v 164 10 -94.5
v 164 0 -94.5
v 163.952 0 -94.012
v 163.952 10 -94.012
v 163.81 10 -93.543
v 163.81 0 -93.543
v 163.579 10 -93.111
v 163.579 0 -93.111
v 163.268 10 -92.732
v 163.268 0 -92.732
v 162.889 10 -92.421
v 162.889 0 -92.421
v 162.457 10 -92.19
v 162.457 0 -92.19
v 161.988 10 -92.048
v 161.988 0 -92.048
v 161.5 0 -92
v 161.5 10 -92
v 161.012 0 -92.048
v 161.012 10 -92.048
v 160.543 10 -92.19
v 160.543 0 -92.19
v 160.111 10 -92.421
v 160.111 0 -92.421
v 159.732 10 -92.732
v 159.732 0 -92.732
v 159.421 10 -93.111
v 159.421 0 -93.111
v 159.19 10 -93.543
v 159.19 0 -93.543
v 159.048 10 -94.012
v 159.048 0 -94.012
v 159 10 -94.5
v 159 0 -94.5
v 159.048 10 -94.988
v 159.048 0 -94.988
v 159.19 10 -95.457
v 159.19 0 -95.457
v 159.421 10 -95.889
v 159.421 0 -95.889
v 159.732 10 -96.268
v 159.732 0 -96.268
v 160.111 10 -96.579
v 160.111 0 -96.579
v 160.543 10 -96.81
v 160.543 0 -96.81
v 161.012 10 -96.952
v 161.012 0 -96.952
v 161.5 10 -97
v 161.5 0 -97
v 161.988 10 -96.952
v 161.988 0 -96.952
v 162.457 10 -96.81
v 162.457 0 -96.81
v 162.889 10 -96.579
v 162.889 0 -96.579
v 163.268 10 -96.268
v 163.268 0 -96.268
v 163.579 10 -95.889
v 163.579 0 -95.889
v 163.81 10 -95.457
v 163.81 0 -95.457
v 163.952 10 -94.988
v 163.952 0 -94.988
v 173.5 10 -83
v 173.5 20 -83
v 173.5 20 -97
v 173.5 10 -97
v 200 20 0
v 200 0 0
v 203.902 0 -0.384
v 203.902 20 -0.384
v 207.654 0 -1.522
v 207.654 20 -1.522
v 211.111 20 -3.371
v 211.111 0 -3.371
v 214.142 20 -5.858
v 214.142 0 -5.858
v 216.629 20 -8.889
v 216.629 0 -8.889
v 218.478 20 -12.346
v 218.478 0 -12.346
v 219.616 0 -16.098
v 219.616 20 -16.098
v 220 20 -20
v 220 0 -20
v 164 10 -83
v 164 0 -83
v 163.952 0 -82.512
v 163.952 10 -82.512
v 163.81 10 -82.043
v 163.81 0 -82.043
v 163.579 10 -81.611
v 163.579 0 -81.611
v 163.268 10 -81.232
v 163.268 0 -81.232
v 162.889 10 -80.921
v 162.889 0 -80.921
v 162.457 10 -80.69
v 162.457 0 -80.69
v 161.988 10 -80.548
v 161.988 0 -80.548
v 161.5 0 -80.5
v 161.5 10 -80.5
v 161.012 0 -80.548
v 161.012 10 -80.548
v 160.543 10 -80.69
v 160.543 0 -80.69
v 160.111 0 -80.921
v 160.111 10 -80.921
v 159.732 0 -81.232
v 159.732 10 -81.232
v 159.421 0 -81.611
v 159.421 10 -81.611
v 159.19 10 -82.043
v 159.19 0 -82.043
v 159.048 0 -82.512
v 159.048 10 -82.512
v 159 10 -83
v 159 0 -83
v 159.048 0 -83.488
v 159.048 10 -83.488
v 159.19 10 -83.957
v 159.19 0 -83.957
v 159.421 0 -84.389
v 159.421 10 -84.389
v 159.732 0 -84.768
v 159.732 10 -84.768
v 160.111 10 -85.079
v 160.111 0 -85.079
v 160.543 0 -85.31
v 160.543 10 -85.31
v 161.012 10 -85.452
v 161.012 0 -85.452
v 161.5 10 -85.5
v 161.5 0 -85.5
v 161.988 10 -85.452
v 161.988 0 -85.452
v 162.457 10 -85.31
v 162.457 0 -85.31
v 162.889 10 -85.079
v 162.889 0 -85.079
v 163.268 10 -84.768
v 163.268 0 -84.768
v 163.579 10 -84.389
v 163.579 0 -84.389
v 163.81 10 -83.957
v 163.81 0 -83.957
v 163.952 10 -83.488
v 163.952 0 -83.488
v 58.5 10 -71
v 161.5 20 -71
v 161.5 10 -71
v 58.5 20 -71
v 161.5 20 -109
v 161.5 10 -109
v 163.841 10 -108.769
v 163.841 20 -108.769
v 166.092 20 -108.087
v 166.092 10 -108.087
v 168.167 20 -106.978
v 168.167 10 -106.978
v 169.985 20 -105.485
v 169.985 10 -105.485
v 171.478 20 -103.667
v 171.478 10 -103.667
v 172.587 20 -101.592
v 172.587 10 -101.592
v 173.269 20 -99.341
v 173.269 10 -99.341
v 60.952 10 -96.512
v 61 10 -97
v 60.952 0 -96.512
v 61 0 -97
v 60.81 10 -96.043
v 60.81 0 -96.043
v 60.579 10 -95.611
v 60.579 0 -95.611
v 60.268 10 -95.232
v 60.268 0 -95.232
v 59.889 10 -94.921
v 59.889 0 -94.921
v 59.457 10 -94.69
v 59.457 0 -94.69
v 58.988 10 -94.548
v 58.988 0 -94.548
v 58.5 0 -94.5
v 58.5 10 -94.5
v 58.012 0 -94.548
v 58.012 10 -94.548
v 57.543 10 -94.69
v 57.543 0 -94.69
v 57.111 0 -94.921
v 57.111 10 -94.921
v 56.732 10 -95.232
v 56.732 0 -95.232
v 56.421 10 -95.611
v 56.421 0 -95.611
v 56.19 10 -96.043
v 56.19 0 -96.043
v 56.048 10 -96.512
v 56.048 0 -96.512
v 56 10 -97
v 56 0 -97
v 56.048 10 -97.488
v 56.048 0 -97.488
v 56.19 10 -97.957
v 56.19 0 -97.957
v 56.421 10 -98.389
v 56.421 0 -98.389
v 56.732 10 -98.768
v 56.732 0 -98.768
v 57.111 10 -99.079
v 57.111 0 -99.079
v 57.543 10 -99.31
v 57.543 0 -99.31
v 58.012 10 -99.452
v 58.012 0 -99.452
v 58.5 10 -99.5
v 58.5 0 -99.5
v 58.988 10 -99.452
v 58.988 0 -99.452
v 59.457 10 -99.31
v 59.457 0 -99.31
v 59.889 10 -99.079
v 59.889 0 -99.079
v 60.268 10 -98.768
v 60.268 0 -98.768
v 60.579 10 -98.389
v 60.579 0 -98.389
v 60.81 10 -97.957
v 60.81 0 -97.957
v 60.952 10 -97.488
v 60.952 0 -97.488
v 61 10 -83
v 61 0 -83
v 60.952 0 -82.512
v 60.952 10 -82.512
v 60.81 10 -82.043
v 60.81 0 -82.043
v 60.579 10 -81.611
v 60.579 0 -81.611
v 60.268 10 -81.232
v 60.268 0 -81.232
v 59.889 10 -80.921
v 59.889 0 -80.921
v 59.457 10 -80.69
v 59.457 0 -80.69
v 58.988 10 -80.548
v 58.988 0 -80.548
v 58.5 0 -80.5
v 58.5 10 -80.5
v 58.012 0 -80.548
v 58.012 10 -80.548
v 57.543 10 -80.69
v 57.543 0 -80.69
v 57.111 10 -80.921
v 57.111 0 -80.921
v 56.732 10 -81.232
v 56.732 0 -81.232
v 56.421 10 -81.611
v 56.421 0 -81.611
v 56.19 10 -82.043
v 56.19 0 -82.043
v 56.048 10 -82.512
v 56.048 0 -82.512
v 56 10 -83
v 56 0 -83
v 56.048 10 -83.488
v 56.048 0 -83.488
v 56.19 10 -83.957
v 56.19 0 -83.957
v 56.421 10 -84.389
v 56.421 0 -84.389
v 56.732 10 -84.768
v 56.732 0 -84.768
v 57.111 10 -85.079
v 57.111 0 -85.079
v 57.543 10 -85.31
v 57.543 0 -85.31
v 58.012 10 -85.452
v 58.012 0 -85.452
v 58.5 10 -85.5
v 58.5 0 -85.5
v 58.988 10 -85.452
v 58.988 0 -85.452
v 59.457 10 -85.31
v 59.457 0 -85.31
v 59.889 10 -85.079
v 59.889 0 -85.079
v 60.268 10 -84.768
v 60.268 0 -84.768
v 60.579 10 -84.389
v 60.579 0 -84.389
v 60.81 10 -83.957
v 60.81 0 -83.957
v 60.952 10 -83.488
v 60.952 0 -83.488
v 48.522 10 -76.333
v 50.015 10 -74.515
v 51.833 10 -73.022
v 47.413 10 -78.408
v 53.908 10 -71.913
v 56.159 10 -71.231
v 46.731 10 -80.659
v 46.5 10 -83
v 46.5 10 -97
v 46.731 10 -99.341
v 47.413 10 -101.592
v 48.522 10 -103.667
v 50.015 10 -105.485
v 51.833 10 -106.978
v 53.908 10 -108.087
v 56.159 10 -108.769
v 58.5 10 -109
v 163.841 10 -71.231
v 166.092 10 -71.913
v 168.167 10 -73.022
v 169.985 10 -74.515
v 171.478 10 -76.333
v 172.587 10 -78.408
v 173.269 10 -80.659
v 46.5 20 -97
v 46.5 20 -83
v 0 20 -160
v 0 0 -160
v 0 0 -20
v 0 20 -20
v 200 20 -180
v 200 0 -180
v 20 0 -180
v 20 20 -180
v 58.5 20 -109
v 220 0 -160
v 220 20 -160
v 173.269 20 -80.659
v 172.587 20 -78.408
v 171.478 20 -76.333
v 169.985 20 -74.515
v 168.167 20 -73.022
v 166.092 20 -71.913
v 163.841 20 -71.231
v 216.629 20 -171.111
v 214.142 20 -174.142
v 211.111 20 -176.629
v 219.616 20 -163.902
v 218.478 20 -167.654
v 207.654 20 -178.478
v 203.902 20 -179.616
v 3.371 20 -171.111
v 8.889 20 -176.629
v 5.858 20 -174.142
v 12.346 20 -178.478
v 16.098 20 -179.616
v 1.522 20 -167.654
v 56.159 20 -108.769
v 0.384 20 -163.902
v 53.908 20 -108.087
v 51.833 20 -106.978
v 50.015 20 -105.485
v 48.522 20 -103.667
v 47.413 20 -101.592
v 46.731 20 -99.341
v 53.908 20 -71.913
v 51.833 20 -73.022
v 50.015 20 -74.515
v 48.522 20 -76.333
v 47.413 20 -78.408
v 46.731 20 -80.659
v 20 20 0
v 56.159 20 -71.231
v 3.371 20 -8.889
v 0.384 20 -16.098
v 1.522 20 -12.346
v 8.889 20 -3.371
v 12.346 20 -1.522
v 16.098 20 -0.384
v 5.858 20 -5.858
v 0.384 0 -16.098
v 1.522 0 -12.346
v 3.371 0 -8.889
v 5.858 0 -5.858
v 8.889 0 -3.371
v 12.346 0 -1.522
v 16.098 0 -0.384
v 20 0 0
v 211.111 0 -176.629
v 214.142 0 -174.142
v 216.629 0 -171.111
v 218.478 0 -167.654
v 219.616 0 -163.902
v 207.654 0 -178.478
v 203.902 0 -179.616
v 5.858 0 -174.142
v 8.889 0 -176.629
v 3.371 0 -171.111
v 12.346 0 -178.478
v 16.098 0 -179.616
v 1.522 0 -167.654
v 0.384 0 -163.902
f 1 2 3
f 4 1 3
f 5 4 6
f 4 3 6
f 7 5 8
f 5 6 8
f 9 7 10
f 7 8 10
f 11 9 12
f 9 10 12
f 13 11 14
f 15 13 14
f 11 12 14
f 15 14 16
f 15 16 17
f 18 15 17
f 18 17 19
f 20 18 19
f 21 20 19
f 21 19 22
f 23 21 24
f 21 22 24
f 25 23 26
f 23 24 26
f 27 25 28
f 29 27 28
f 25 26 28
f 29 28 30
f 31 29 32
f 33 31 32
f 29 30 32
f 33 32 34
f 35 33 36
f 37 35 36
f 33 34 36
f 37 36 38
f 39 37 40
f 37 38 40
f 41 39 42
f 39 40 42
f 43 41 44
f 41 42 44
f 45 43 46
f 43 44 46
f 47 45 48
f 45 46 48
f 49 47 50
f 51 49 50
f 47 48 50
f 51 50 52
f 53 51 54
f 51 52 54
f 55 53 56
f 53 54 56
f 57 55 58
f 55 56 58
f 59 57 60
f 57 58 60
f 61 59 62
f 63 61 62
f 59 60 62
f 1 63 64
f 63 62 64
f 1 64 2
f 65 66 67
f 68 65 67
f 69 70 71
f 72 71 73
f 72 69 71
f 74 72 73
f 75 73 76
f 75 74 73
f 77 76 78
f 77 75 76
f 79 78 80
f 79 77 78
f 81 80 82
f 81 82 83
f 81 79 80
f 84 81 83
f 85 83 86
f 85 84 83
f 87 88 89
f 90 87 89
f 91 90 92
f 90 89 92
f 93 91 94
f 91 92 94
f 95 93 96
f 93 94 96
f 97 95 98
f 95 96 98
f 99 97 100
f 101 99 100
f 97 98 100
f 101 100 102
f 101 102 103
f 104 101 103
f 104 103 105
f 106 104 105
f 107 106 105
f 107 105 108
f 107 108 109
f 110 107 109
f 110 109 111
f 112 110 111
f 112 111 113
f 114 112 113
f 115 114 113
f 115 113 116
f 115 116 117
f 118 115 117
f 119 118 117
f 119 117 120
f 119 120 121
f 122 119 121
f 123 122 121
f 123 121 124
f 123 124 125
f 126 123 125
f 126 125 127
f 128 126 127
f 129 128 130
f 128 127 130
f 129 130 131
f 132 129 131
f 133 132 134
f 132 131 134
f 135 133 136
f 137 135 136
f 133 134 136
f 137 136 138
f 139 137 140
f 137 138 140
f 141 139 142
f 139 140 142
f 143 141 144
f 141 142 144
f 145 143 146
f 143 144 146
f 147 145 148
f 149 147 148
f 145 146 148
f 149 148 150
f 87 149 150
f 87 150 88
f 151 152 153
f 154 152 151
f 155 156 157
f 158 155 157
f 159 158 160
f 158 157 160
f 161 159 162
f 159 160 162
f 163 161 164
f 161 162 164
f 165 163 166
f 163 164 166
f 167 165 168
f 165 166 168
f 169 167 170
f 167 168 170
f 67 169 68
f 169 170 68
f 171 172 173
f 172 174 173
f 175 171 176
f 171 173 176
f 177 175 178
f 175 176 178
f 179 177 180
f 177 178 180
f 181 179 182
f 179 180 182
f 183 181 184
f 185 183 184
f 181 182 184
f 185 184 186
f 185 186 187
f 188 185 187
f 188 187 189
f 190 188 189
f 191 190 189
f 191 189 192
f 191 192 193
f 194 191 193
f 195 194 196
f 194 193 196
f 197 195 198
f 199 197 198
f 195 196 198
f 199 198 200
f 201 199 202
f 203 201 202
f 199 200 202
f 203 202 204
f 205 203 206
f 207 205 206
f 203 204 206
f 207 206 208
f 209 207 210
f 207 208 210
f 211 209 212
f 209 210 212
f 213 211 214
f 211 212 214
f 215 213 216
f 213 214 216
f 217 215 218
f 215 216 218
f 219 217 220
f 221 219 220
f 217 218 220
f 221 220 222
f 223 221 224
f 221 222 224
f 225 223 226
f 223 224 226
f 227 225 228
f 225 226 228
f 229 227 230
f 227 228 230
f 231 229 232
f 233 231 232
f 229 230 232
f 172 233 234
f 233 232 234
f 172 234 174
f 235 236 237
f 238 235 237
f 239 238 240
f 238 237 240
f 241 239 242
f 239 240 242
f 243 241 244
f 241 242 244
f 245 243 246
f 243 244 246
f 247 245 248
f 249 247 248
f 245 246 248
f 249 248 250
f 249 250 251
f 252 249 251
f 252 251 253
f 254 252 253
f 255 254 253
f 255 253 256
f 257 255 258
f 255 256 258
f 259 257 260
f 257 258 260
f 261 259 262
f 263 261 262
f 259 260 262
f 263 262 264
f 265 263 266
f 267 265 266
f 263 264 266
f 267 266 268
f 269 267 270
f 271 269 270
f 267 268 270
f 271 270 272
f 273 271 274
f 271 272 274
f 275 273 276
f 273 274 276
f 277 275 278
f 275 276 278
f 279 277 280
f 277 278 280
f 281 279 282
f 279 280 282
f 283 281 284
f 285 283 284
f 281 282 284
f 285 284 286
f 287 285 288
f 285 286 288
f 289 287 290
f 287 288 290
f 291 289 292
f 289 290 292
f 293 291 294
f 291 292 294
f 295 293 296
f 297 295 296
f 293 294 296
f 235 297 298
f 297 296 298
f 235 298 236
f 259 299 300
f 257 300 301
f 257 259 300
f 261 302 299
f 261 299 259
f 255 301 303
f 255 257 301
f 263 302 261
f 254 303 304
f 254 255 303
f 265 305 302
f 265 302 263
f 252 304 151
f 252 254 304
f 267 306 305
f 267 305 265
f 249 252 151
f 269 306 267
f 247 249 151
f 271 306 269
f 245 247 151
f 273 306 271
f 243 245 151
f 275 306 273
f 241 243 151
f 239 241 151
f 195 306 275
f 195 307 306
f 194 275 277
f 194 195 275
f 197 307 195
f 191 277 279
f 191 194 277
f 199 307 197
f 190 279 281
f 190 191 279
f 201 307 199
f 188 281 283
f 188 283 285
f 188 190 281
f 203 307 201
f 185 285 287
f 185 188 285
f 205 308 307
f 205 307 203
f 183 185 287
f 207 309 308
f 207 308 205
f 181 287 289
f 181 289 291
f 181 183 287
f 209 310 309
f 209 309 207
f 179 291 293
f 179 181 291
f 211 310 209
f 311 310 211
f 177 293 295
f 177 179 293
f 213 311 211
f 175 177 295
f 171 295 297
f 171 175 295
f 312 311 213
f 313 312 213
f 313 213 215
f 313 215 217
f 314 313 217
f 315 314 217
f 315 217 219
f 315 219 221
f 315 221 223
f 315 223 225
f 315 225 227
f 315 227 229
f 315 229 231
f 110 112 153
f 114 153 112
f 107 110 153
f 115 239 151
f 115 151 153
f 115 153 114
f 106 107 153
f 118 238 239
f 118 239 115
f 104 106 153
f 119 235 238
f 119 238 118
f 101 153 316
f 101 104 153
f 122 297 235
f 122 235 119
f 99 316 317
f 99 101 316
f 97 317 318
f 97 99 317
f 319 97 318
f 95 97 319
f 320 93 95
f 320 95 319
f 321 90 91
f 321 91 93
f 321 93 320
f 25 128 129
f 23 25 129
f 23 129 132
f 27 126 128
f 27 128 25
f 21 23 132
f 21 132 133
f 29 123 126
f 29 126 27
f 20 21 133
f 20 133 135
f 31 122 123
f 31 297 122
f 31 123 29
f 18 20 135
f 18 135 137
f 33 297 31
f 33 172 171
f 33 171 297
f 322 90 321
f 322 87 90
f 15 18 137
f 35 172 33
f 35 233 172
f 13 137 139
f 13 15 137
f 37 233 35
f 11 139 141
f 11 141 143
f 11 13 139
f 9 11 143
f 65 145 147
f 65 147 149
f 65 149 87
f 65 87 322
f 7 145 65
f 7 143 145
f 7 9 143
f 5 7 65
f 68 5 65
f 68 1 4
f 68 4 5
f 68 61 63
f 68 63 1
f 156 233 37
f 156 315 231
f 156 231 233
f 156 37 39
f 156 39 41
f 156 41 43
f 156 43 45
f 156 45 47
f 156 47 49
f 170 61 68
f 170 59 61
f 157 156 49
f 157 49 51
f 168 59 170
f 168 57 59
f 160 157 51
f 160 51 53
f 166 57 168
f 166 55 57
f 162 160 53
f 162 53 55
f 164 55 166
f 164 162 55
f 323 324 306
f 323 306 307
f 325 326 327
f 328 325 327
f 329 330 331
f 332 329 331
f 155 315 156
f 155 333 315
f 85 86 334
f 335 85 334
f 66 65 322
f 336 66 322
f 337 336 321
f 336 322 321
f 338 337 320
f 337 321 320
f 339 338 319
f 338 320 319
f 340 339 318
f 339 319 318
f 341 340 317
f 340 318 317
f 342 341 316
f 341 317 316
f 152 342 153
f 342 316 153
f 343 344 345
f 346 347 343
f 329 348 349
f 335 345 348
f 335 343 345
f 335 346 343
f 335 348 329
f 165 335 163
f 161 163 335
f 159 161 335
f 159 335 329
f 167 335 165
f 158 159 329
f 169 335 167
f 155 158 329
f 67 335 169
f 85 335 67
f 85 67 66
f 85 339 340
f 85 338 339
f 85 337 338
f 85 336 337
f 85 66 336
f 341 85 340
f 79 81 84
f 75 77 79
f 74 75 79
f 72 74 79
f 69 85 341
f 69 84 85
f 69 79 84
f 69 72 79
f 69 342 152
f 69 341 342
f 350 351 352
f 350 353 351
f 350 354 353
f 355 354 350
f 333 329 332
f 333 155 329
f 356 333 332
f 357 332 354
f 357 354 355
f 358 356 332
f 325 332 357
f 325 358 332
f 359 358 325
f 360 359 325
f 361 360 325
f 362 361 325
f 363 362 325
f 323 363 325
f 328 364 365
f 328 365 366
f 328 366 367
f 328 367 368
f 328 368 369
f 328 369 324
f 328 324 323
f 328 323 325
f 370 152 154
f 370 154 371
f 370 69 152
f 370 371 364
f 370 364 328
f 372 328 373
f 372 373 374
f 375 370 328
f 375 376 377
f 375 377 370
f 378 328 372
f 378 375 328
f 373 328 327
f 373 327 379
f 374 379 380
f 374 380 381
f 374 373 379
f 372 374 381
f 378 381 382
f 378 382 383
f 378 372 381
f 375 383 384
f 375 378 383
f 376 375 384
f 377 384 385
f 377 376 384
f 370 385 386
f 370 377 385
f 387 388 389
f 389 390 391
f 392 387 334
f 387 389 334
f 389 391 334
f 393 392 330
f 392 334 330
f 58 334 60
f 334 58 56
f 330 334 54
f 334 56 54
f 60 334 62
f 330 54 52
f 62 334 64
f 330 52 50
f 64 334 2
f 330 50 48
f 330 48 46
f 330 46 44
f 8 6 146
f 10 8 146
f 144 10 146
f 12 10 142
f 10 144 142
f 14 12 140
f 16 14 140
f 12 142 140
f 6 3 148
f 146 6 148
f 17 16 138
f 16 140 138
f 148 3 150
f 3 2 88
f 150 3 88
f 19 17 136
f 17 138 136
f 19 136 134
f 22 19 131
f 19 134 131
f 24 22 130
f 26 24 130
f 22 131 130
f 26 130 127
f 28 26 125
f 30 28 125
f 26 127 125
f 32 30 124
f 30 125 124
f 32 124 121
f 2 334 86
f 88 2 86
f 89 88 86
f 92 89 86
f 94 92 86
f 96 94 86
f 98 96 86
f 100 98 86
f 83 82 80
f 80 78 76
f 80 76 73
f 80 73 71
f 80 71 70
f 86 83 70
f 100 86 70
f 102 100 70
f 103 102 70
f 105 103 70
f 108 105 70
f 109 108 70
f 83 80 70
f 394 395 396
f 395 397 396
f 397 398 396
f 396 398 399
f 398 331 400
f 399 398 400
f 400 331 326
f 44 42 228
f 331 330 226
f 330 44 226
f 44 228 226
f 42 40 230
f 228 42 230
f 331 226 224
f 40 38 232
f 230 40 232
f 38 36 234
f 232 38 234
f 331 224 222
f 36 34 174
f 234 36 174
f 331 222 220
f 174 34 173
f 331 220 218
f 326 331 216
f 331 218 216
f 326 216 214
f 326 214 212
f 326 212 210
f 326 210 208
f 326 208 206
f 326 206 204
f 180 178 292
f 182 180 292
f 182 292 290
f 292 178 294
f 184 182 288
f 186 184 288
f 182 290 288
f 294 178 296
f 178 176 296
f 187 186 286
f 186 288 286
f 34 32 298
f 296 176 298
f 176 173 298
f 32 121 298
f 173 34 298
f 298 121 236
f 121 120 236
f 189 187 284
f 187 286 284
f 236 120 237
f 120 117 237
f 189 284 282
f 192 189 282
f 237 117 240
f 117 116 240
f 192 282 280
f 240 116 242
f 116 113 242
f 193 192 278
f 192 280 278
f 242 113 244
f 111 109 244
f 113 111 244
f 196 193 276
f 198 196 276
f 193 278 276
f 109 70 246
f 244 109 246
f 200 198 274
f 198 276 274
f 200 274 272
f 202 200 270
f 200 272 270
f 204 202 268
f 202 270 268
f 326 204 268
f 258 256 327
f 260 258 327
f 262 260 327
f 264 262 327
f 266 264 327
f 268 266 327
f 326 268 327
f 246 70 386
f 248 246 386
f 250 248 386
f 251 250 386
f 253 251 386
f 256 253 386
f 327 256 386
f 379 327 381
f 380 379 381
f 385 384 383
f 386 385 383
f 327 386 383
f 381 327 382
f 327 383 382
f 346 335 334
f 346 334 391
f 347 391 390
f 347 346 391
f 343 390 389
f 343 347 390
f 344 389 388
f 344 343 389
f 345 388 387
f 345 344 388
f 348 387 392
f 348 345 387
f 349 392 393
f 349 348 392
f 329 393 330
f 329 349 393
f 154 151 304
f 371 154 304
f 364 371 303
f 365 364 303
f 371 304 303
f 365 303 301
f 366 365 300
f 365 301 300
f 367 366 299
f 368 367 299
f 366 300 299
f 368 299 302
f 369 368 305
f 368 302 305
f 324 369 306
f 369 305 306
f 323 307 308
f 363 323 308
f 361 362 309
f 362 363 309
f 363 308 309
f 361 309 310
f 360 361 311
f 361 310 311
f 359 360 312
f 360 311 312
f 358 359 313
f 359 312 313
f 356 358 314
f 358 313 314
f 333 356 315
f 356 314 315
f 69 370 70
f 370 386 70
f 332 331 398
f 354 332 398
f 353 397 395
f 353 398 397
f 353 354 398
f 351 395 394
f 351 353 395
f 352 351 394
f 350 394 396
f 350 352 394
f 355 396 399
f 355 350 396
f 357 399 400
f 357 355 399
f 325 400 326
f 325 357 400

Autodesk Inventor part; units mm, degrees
ref_plane "YZ Plane" through (0, 0, 0) normal (1, 0, 0) x (0, 1, 0)
ref_plane "XZ Plane" through (0, 0, 0) normal (0, 1, 0) x (-1, 0, 0)
ref_plane "XY Plane" through (0, 0, 0) normal (0, 0, 1) x (1, 0, 0)
sketch "Sketch2" plane through (0, 0, 0) normal (0, 1, 0) x (-1, 0, 0)
  line L0 (0, 0) -> (-220, 0)
  line L1 (-220, 0) -> (-220, -180)
  line L2 (-220, -180) -> (0, -180)
  line L3 (0, -180) -> (0, 0)
  dimension "d0" = 220
  dimension "d1" = 180
extrude "Extrusion1" add sketch "Sketch2" along normal blind 20
sketch "Sketch3" plane through (0, 20, 0) normal (0, 1, 0) x (1, 0, 0)
  line L0 (0, 20) -> (0, 160)
  line L1 (0, 90) -> (46.5, 90)
  line L2 (46.5, 90) -> (173.5, 90)
  line L3 (173.5, 90) -> (173.5, 109)
  line L4 (173.5, 109) -> (173.5, 71)
  line L5 (173.5, 71) -> (46.5, 71)
  line L6 (46.5, 71) -> (46.5, 109)
  line L7 (46.5, 109) -> (173.5, 109)
  line L8 (0, 0) -> (220, 0) projected
  line L9 (220, 0) -> (220, 180) projected
  line L10 (220, 180) -> (0, 180) projected
  line L11 (0, 180) -> (0, 0) projected
  dimension "d4" = 46.5
  dimension "d5" = 127
  dimension "d6" = 19
  dimension "d7" = 38
  dimension "d11" = 71
extrude "Extrusion2" cut sketch "Sketch3" against normal blind 10 contours L6 L7 L3 L2 | L2 L4 L5 L6
fillet "Fillet1" radius 20 4 edges at (0, 10, -180) (0, 10, 0) (220, 10, 0) (220, 10, -180)
fillet "Fillet2" radius 12 4 edges at (46.5, 15, -109) (173.5, 15, -109) (46.5, 15, -71) (173.5, 15, -71)
sketch "Sketch5" plane through (0, 0, 0) normal (0, -1, 0) x (1, 0, 0)
  line L0 (110, -90) -> (58.5, -90) construction
  line L1 (110, -90) -> (161.5, -90) construction
  line L2 (58.5, -90) -> (58.5, -97) construction
  line L3 (58.5, -97) -> (58.5, -83) construction
  line L4 (58.5, -83) -> (161.5, -83) construction
  line L5 (161.5, -83) -> (161.5, -97) construction
  circle A0 centre (58.5, -97) radius 2.5
  circle A1 centre (58.5, -83) radius 2.5
  circle A2 centre (161.5, -83) radius 2.5
  circle A3 centre (161.5, -94.5) radius 2.5
  line L6 (20, 0) -> (200, 0) projected
  arc A4 (200, -180) -> (220, -160) centre (200, -160) ccw projected
  line L7 (220, -20) -> (220, -160) projected
  arc A5 (220, -20) -> (200, 0) centre (200, -20) ccw projected
  line L8 (20, 0) -> (200, 0) projected
  arc A6 (20, 0) -> (0, -20) centre (20, -20) ccw projected
  line L9 (0, -160) -> (0, -20) projected
  arc A7 (0, -160) -> (20, -180) centre (20, -160) ccw projected
  line L10 (200, -180) -> (20, -180) projected
  point P0 (0, 0)
  point P1 (110, -90)
  dimension "d38" = 51.5
  dimension "d39" = 51.5
  dimension "d40" = 7
  dimension "d41" = 14
  dimension "d42" = 5
  dimension "d43" = 5
  dimension "d44" = 5
  dimension "d45" = 5
  dimension "d46" = 103
  dimension "d47" = 51.5
  dimension "d48" = 0
  dimension "d49" = 11.5
  dimension "d50" = 14
  dimension "d51" = 58.5
  dimension "d52" = 83
extrude "Extrusion4" cut sketch "Sketch5" against normal through all contours A0 | A1 | A2 | A3
properties part number "reverse gear stand"
